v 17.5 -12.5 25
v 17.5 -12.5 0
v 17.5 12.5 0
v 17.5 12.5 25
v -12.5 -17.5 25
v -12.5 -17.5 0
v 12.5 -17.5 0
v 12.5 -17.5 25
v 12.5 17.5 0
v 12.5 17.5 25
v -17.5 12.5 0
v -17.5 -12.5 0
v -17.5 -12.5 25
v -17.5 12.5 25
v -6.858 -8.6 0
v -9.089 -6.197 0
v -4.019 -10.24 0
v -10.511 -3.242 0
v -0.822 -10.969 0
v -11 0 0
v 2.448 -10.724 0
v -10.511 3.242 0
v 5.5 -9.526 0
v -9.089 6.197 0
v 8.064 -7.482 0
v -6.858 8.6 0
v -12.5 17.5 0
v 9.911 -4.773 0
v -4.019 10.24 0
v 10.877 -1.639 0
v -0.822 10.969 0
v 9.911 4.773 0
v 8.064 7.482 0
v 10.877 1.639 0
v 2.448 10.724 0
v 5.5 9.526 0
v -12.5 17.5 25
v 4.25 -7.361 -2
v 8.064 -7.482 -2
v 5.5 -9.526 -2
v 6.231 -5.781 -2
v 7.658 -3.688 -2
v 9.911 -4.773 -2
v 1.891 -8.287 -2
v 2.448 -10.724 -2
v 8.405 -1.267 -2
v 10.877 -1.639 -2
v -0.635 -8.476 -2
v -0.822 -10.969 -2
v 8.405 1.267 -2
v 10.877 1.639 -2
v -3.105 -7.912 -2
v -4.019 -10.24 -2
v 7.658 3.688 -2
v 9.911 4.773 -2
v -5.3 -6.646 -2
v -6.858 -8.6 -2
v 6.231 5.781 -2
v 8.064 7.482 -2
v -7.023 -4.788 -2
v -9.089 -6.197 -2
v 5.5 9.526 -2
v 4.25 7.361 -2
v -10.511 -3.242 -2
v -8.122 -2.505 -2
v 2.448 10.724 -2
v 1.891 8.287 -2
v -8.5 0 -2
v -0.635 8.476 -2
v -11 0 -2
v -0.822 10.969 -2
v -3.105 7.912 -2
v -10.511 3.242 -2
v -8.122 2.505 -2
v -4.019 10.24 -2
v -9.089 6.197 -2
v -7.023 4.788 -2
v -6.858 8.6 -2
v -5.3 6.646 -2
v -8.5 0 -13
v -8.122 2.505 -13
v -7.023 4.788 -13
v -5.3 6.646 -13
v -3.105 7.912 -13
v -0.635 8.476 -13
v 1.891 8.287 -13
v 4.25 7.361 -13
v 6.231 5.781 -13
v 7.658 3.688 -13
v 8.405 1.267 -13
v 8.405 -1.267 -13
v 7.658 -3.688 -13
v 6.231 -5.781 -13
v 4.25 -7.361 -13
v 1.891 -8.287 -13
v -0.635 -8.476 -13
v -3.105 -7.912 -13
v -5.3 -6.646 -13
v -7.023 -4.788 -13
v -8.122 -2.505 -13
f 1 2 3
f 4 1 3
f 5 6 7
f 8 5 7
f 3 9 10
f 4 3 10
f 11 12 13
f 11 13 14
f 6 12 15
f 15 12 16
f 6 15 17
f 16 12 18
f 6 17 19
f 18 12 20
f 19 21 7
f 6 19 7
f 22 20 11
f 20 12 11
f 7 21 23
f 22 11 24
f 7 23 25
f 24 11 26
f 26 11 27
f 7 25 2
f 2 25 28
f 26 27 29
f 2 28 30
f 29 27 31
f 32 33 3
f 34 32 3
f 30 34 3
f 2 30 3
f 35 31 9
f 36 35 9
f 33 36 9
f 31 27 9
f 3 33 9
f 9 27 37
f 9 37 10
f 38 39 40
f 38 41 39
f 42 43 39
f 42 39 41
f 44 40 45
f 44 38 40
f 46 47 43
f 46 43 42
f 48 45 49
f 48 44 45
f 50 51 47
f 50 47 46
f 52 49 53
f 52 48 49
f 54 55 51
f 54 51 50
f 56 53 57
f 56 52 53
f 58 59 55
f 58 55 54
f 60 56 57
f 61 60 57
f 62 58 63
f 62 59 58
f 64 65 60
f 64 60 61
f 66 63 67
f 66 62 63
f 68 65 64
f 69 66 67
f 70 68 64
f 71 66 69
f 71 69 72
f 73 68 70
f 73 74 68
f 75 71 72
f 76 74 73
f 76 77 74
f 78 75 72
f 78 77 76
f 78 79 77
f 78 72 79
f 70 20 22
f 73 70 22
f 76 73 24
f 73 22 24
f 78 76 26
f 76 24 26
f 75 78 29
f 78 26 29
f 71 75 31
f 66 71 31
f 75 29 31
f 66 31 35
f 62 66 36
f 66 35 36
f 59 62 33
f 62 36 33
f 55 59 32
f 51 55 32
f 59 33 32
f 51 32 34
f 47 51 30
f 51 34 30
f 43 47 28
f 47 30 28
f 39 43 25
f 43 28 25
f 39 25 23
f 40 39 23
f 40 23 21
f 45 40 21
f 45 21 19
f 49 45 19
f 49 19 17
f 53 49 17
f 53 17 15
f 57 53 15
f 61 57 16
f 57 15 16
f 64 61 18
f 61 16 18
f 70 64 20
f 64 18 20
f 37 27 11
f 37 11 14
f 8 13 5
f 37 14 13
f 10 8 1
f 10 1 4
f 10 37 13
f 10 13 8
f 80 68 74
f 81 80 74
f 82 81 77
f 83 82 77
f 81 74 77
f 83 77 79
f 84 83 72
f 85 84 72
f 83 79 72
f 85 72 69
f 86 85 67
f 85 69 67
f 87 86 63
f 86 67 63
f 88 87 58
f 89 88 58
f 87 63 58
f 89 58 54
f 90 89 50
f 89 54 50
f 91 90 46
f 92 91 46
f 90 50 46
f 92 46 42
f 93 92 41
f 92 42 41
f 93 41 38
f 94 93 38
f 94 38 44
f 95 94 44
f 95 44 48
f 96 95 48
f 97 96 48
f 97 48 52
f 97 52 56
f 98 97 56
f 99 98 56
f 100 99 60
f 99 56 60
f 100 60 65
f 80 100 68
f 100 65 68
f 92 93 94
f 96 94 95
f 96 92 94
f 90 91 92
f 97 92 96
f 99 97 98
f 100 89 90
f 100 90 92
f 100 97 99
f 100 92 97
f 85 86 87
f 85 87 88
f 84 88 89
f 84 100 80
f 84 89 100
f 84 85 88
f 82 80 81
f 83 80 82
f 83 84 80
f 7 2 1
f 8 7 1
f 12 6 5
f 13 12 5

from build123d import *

# Parameters (mm, degrees)
SKETCH_1_W      = 35
SKETCH_1_H      = 35
EXTRUDE_1_DEPTH = 25
CHAMFER_1_SIZE  = 5
SKETCH_2_R      = 11
EXTRUDE_2_DEPTH = 2
SKETCH_3_R      = 8.5
EXTRUDE_3_DEPTH = 11


with BuildPart() as part:
    # Эскиз1 → Бобышка-Вытянуть1 (new body)
    with BuildSketch(Plane.XY):
        Rectangle(SKETCH_1_W, SKETCH_1_H)
    extrude(amount=EXTRUDE_1_DEPTH)

    # Фаска1
    chamfer_1_edges = [part.edges().sort_by_distance(p)[0] for p in [
        (17.5, -17.5, 12.5),
        (-17.5, -17.5, 12.5),
        (-17.5, 17.5, 12.5),
        (17.5, 17.5, 12.5),
    ]]
    chamfer(chamfer_1_edges, length=CHAMFER_1_SIZE)

    # Эскиз2 → Бобышка-Вытянуть2 (add)
    with BuildSketch(Plane(origin=(0, 0, 0), x_dir=(-1, 0, 0), z_dir=(0, 0, -1))):
        Circle(SKETCH_2_R)
    extrude(amount=EXTRUDE_2_DEPTH)

    # Эскиз3 → Бобышка-Вытянуть3 (add)
    with BuildSketch(Plane(origin=(0, 0, -2), x_dir=(-1, 0, 0), z_dir=(0, 0, -1))):
        Circle(SKETCH_3_R)
    extrude(amount=EXTRUDE_3_DEPTH)


solid = part.part
